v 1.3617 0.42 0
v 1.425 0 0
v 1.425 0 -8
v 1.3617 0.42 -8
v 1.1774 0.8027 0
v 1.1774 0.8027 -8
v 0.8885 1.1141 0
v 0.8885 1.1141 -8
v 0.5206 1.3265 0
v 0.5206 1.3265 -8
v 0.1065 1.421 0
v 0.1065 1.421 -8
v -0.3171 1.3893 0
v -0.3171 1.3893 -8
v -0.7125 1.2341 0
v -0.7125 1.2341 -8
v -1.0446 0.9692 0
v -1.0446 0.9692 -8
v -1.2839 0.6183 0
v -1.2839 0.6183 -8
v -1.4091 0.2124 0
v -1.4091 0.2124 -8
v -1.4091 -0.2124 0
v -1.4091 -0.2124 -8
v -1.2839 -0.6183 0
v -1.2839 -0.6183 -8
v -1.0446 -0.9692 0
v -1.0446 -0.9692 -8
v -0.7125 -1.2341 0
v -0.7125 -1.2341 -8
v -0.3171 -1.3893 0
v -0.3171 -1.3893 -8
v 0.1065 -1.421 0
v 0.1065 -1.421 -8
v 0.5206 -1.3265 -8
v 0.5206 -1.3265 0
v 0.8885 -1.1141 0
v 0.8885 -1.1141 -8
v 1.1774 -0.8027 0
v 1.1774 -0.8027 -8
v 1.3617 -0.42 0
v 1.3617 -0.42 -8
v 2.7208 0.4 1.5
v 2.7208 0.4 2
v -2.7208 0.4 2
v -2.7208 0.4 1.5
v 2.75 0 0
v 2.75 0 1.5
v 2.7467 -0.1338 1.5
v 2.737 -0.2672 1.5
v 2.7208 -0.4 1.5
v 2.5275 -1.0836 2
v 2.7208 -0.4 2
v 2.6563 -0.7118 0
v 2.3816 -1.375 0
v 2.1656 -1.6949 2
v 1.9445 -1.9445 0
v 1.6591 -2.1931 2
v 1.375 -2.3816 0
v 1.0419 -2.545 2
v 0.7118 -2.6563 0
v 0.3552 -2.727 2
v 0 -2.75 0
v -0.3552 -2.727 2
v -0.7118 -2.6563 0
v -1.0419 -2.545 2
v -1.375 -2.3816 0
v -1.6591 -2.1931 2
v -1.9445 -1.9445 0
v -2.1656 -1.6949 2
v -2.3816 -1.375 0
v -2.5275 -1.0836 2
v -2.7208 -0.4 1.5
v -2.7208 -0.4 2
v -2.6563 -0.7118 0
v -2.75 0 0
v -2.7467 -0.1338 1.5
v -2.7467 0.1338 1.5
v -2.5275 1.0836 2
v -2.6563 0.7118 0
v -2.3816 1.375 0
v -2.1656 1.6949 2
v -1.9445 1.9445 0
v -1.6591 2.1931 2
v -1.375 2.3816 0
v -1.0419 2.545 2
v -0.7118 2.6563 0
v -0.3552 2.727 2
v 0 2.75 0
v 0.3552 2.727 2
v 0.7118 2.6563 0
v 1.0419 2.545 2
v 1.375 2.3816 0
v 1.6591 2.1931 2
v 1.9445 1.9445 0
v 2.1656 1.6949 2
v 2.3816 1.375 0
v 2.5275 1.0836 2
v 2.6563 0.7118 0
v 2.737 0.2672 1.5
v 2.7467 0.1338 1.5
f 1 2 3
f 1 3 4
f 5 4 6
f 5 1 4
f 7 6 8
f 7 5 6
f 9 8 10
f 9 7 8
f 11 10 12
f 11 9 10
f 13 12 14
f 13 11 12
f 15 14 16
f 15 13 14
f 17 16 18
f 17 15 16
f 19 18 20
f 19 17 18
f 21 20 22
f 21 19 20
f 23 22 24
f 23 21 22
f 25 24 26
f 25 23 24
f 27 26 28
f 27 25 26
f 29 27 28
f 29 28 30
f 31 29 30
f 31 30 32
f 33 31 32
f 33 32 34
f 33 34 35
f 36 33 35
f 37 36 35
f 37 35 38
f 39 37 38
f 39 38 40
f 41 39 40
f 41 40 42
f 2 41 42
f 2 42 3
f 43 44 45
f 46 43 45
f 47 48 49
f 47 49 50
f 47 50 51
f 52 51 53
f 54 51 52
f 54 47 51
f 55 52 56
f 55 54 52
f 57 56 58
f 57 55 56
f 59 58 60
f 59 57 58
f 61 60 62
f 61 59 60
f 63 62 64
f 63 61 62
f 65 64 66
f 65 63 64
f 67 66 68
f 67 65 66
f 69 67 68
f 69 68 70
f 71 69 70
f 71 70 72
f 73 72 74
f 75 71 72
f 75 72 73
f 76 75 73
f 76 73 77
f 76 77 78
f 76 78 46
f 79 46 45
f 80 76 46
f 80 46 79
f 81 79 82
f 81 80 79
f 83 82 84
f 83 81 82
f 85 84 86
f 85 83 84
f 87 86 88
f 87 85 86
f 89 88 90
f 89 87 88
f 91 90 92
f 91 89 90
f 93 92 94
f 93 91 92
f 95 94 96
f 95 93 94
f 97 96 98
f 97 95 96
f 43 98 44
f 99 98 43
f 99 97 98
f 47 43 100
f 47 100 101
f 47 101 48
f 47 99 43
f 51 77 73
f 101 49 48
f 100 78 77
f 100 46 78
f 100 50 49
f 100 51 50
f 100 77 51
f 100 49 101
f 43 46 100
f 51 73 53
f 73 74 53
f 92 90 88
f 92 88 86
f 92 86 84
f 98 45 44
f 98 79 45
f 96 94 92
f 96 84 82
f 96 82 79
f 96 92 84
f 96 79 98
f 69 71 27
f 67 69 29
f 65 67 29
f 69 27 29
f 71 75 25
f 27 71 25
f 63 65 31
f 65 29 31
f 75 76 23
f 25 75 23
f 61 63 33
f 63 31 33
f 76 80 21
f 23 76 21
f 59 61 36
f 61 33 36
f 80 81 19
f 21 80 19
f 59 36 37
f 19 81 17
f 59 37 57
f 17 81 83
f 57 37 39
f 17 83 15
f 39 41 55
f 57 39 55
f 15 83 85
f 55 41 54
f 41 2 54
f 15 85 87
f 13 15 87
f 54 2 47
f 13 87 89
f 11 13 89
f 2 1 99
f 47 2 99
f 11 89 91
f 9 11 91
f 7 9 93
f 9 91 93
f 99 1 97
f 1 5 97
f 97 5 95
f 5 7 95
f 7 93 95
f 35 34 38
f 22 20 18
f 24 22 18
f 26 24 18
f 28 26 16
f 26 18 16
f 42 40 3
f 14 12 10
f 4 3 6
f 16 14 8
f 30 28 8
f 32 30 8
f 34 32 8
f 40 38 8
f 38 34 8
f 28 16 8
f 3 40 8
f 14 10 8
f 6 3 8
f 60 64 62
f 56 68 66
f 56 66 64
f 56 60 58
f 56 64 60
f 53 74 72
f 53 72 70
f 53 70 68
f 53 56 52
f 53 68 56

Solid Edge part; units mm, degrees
sketch "Sketch1" plane through (0, 0, 0) normal (0, 0, 1) x (1, 0, 0)
  circle A0 centre (0, 0) radius 1.425
extrude "Protrusion1" add sketch "Sketch1" against normal blind 8
sketch "Sketch2" plane through (0, 0, 0) normal (0, 0, 1) x (1, 0, 0)
  circle A0 centre (0, 0) radius 2.75
extrude "ExtrudedProtrusion_2" add sketch "Sketch2" along normal blind 2
sketch "Sketch3" plane through (0, 0, 2) normal (0, 0, 1) x (1, 0, 0)
  line L0 (3.6964, 0.4) -> (-3.6964, 0.4)
  line L1 (-3.6964, 0.4) -> (-3.6964, -0.4)
  line L2 (-3.6964, -0.4) -> (3.6964, -0.4)
  line L3 (3.6964, -0.4) -> (3.6964, 0.4)
extrude "ExtrudedCutout_1" cut sketch "Sketch3" against normal blind 0.5
properties material "Graphite"
